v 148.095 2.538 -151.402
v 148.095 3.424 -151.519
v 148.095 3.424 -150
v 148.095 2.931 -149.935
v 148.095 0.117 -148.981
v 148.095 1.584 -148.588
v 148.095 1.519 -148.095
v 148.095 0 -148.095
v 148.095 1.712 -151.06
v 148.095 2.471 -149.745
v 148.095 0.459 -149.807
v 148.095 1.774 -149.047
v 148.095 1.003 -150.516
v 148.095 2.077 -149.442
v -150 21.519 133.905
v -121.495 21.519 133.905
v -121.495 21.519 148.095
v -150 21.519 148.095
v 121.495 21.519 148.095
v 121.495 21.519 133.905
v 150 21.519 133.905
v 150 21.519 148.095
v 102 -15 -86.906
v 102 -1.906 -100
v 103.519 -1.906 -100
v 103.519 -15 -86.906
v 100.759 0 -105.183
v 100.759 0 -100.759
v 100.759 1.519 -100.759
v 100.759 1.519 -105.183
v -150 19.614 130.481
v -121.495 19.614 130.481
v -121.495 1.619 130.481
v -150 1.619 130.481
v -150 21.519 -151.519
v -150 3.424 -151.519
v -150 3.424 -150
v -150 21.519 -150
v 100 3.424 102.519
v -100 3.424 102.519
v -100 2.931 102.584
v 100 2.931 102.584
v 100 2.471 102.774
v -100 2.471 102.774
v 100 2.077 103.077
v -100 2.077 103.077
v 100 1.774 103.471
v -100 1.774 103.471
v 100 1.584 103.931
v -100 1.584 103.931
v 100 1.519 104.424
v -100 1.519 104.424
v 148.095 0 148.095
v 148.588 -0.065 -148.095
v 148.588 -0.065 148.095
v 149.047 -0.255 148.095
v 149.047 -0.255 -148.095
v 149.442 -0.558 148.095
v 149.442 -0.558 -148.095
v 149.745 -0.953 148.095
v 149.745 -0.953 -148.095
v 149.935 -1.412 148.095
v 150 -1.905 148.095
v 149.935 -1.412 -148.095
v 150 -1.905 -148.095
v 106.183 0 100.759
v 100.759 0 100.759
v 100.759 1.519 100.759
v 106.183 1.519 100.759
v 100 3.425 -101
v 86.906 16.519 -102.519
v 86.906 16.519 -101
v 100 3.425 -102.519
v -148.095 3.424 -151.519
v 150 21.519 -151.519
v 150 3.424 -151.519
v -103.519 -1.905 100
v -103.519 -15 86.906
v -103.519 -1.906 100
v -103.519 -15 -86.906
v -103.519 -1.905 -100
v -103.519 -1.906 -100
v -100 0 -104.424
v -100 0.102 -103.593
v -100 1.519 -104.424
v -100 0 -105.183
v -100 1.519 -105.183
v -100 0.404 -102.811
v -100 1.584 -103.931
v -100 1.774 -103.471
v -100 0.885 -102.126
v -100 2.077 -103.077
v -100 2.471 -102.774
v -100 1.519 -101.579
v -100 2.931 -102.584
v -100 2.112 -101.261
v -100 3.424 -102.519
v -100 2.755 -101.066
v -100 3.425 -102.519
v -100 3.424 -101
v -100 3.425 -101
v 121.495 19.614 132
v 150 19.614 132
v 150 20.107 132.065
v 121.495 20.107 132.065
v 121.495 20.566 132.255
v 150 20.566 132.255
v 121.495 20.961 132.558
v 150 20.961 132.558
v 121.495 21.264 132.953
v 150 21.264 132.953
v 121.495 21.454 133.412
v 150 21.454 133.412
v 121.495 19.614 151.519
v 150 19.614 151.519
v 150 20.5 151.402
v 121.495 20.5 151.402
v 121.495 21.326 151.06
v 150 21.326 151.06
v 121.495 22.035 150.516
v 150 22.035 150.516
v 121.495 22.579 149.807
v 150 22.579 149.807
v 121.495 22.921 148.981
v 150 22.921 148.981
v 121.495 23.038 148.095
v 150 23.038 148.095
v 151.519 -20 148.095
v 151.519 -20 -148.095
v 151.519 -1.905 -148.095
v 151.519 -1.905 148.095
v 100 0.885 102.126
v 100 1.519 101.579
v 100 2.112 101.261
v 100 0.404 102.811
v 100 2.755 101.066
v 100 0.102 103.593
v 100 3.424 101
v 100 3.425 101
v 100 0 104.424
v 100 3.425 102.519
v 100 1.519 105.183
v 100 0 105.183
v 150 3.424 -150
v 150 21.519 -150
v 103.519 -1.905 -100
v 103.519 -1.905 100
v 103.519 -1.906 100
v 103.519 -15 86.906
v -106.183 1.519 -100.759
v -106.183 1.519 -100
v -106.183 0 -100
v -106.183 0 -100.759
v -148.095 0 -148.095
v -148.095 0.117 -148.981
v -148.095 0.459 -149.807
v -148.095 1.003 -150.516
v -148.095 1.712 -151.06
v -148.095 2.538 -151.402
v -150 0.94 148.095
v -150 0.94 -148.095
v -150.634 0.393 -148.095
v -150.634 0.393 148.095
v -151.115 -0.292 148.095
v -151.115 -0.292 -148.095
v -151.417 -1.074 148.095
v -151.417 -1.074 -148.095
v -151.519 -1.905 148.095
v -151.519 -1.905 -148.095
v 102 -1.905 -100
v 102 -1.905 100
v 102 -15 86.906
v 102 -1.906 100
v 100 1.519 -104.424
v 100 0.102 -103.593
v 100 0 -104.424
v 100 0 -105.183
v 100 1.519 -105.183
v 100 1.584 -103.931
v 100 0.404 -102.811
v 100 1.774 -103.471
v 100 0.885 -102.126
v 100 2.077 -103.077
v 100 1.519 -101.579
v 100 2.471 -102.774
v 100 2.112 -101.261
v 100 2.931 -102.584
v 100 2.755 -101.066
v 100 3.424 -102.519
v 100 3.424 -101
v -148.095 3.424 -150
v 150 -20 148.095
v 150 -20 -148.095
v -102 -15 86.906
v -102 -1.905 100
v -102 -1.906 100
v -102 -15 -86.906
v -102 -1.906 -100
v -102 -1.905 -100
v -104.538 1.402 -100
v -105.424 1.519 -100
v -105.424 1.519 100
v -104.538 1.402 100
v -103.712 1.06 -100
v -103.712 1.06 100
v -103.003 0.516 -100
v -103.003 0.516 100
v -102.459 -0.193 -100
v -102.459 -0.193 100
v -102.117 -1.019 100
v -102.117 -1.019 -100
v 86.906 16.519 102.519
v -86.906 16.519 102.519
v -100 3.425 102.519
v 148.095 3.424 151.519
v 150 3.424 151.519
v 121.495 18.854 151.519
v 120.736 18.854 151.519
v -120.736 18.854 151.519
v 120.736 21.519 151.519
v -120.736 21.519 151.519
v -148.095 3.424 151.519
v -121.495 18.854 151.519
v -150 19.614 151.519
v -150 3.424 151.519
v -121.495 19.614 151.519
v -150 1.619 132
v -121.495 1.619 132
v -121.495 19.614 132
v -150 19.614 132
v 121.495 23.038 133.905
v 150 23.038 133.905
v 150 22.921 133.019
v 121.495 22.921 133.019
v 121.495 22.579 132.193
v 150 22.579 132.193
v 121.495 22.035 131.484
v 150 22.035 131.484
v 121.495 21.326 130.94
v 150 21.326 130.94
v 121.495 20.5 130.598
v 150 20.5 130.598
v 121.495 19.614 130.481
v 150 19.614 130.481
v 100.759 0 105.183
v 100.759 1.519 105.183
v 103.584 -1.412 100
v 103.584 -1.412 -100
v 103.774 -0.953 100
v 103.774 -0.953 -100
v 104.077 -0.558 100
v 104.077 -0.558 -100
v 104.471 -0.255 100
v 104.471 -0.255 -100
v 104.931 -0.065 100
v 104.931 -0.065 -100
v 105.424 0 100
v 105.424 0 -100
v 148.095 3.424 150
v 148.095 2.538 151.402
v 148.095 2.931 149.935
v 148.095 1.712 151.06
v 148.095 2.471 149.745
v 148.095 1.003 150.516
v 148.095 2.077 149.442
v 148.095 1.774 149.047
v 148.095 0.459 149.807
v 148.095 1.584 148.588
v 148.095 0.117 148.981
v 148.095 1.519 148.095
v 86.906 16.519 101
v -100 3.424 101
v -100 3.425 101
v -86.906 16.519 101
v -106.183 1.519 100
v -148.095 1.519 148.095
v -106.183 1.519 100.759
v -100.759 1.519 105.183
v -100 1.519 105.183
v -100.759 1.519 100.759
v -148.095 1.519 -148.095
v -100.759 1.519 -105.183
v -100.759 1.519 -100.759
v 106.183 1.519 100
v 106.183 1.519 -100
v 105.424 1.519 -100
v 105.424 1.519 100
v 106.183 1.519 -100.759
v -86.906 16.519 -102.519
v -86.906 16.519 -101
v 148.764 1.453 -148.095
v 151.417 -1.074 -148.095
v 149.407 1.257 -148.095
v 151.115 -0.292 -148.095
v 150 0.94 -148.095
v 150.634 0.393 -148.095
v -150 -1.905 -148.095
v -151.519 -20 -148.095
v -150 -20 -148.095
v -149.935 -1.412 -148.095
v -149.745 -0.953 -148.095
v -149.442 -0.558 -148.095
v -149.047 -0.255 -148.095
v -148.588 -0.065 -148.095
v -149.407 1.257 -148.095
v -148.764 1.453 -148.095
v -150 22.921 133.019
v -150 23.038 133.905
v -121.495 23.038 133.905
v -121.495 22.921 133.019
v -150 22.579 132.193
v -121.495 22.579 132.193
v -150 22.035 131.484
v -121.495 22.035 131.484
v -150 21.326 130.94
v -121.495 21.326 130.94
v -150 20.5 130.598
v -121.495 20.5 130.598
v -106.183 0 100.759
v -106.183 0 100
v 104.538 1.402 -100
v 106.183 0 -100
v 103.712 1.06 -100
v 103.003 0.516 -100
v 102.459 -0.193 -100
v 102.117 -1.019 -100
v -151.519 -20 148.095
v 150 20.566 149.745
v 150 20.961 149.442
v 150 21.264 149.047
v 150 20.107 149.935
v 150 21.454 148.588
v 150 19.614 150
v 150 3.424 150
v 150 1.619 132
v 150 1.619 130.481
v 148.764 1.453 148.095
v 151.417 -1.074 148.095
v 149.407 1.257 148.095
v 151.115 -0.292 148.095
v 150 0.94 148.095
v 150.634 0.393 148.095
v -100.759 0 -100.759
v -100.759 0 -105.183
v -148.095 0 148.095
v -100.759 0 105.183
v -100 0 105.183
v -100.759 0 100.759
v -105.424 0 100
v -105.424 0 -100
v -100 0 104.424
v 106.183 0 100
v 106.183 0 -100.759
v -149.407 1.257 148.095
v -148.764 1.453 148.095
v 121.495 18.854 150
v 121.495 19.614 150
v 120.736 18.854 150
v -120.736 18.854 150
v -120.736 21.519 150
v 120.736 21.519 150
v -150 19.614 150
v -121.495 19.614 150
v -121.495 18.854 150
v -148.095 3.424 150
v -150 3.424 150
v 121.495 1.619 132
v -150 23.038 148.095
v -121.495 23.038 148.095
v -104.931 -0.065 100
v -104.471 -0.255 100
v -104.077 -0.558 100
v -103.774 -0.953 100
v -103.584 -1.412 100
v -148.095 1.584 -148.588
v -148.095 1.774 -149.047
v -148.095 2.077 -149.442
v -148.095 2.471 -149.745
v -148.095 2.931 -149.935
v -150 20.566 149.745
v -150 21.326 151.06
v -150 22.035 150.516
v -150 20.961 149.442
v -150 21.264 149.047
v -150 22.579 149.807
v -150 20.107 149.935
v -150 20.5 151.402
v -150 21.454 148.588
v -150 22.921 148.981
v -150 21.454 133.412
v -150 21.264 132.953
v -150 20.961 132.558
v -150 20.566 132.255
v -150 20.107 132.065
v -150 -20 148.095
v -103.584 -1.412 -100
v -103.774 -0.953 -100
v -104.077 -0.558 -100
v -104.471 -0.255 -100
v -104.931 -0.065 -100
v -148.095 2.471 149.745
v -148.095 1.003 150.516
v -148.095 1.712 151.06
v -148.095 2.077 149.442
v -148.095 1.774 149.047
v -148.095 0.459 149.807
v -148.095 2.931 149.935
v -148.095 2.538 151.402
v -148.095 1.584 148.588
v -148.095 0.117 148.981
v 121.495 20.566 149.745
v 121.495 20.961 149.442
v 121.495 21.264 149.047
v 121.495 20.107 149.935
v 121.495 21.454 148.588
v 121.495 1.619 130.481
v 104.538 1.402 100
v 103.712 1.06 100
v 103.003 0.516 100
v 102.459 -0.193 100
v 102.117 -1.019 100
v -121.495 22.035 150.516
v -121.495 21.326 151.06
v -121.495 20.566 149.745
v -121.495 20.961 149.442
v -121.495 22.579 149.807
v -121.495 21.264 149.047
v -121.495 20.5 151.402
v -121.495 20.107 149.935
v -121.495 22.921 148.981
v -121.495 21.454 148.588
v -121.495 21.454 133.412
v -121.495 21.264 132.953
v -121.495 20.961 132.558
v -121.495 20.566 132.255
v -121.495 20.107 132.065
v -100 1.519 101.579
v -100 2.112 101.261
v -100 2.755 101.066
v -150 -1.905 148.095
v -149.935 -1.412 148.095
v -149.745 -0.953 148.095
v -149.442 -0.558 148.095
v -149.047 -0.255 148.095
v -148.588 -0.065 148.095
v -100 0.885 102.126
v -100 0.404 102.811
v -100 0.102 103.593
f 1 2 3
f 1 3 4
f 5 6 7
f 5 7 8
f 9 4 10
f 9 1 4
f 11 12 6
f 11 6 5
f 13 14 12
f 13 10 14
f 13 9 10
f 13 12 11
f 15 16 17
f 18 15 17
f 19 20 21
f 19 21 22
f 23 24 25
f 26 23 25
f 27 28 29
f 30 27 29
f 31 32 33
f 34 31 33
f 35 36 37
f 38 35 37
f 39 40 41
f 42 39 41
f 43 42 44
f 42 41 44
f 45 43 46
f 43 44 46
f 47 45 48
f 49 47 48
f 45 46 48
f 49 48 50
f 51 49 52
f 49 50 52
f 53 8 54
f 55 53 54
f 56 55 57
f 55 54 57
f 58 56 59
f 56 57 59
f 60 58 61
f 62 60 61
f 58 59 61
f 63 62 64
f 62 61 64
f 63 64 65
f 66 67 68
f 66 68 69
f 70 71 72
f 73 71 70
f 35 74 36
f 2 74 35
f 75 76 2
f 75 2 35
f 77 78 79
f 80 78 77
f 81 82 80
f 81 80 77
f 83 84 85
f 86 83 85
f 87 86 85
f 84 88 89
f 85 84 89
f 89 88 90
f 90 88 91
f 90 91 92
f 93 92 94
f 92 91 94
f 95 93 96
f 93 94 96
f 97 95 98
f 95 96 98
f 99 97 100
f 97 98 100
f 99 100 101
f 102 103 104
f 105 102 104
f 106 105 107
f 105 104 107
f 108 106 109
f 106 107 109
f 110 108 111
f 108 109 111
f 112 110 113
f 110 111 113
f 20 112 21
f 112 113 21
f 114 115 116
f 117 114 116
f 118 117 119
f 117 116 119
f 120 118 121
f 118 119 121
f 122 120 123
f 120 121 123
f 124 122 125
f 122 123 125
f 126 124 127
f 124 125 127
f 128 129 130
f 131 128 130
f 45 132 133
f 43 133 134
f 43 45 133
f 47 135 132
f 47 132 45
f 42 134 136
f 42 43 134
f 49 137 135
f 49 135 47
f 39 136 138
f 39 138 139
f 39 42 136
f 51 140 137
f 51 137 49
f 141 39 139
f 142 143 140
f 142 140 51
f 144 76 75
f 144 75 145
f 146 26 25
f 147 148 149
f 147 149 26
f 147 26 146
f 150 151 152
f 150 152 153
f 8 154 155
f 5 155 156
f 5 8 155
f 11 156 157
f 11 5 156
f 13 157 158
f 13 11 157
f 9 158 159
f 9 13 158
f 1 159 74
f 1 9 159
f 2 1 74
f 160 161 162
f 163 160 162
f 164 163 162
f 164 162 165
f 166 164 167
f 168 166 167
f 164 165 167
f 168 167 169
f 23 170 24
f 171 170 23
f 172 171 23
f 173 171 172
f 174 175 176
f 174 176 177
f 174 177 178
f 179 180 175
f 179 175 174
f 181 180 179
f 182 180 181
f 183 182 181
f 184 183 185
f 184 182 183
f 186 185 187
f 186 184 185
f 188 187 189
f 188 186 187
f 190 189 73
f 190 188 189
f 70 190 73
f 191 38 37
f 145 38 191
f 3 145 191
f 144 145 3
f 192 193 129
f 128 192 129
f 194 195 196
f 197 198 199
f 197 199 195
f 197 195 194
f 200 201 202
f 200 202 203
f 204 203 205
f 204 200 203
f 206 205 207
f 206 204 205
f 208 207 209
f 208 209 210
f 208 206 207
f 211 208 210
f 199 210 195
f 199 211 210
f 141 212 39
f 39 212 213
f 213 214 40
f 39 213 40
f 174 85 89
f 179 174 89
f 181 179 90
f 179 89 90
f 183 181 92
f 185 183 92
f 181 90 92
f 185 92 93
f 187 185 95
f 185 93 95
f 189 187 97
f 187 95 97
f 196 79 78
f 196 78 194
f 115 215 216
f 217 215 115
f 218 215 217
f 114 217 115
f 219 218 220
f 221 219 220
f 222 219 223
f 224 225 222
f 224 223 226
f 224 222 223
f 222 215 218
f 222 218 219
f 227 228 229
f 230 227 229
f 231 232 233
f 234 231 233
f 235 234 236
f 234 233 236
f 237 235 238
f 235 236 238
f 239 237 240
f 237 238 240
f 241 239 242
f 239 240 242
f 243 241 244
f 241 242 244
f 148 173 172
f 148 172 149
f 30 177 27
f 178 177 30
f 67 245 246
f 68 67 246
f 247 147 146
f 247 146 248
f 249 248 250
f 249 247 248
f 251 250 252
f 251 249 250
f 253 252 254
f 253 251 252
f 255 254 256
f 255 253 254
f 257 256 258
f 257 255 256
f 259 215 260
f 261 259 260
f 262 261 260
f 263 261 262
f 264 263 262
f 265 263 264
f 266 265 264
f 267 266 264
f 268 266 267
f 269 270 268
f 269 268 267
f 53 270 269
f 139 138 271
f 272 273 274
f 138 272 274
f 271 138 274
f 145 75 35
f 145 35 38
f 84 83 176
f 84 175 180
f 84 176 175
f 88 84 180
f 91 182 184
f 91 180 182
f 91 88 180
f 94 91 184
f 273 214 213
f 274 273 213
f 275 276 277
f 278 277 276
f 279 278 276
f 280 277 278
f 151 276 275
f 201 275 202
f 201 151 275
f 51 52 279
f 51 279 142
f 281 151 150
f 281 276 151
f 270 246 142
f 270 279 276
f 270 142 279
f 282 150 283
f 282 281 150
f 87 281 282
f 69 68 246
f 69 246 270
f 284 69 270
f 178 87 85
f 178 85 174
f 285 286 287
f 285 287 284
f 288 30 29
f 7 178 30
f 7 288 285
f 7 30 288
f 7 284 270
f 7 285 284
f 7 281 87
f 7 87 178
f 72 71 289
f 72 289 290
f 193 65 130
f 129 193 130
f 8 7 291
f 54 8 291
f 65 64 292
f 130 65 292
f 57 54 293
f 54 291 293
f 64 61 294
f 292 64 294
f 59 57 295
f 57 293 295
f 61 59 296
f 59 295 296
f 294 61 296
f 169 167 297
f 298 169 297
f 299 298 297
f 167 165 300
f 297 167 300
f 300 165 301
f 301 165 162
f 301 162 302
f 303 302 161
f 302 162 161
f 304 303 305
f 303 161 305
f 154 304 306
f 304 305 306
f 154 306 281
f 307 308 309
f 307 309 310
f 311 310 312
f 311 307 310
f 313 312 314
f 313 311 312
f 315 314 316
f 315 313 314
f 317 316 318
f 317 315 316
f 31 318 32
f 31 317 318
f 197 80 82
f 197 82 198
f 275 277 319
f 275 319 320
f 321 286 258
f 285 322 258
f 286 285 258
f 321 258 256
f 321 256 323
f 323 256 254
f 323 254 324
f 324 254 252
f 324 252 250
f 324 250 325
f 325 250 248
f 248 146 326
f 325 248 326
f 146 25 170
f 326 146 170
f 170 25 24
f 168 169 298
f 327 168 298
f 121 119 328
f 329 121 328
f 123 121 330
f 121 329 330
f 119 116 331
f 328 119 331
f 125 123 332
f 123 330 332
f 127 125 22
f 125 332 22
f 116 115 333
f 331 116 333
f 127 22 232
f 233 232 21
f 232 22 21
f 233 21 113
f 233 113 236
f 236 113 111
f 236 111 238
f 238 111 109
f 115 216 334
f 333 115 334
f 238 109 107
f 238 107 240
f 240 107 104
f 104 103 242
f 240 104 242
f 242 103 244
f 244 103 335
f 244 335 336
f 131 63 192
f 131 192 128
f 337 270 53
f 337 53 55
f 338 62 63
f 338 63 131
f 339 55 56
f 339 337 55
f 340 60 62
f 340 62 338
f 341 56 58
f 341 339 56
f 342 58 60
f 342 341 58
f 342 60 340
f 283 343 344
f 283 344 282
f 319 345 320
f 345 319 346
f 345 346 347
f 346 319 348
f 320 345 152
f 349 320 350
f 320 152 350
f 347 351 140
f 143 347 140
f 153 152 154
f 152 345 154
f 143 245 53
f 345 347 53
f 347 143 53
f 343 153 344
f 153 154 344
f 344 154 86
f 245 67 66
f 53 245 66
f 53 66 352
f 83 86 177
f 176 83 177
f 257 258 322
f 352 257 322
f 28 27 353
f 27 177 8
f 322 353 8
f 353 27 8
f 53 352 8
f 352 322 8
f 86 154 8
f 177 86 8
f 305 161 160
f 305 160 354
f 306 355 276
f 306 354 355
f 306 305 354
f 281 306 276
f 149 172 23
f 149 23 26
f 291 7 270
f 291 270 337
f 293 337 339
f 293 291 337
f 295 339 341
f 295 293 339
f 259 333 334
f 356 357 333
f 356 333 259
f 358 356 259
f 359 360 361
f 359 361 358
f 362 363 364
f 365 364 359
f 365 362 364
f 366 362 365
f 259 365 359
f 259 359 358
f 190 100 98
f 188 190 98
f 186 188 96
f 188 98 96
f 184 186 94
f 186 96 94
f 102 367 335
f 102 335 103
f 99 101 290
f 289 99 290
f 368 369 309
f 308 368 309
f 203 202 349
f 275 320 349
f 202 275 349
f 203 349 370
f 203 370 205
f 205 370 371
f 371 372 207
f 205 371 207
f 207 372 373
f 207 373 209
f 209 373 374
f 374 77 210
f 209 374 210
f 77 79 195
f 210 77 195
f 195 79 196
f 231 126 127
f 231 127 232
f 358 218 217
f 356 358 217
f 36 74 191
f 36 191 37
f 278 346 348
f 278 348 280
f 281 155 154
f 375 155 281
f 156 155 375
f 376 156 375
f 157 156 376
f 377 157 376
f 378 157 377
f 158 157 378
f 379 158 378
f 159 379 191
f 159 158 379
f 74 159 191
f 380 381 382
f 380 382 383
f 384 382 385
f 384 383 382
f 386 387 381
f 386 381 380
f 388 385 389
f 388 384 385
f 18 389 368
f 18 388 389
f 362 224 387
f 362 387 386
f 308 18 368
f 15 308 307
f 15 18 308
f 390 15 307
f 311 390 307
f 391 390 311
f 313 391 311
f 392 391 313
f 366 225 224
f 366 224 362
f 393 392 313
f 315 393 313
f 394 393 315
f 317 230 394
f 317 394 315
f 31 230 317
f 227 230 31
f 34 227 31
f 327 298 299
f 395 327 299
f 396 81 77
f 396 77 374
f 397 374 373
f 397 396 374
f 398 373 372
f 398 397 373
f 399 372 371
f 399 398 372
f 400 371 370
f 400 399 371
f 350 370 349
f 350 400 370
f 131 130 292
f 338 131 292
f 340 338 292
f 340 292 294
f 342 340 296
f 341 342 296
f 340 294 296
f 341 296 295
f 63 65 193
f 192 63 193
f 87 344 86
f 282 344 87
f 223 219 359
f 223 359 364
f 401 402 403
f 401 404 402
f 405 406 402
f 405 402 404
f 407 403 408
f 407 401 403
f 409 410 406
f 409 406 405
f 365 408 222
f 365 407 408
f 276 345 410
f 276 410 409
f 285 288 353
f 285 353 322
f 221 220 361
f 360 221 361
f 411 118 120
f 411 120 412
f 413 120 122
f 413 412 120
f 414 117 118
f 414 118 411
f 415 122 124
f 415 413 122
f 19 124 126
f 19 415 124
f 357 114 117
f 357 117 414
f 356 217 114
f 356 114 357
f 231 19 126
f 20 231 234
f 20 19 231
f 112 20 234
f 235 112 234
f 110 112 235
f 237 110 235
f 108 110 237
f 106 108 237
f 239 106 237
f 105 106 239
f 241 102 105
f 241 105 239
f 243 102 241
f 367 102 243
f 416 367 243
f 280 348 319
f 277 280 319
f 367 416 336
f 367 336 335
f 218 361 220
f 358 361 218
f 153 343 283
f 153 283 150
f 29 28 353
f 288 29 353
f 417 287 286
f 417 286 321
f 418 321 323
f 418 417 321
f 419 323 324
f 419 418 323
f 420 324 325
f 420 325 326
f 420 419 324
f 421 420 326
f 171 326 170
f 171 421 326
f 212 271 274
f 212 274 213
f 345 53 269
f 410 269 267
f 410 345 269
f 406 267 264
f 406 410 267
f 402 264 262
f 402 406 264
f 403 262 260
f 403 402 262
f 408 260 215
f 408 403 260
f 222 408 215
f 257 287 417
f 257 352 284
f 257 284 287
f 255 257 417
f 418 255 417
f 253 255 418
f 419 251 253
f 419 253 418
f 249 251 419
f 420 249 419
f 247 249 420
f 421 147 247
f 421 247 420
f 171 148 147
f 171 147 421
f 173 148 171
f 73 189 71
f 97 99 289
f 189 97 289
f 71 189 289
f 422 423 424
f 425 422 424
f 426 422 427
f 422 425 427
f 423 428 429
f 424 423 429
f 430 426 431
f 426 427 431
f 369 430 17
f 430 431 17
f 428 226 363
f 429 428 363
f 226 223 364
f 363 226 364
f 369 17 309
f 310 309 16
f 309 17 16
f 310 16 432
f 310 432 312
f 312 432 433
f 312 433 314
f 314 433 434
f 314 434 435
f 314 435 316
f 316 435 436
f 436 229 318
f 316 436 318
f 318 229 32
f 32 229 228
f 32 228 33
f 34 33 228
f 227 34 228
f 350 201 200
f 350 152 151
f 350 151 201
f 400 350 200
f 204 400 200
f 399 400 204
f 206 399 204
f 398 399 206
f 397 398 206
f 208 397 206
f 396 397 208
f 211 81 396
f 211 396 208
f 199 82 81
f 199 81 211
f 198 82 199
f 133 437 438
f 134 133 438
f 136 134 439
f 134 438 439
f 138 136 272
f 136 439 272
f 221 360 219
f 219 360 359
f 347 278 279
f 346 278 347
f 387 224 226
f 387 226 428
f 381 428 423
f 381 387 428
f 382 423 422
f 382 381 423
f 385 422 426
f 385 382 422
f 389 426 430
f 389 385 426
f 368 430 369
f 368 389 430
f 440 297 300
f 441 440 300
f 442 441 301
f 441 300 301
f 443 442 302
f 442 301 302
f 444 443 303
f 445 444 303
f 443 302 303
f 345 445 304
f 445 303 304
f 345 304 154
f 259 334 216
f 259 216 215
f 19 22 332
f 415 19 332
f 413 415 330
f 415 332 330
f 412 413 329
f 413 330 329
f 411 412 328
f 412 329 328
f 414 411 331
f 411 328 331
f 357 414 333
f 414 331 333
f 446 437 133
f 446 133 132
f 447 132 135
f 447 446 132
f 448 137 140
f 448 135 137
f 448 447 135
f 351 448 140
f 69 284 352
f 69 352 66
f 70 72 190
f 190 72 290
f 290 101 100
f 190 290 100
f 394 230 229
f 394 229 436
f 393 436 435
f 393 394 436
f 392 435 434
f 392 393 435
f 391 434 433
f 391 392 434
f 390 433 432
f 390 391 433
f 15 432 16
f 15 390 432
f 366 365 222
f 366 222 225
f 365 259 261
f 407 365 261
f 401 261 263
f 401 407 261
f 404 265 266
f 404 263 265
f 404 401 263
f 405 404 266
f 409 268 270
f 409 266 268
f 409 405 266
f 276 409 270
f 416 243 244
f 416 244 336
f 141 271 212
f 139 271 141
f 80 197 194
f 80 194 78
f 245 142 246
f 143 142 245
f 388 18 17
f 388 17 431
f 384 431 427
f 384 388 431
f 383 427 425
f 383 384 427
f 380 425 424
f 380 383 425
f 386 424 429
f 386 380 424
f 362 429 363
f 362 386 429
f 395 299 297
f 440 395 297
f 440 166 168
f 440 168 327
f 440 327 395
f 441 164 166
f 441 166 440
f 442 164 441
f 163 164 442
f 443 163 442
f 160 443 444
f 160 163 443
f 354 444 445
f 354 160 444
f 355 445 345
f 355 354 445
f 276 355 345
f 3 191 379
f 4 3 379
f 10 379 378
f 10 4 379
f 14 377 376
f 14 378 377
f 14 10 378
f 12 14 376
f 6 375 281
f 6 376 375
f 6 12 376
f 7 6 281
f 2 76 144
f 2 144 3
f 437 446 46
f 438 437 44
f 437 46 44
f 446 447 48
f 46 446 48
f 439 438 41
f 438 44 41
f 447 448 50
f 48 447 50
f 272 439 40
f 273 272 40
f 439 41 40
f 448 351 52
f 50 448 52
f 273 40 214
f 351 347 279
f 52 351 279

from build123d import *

# Parameters (mm, degrees)
SKETCH1_W                       = 300
SKETCH1_H                       = 300
SKETCH1_W_2                     = 200
SKETCH1_H_2                     = 200
BASE_FLANGE1_DEPTH              = 1.51892
EDGE_FLANGE10_STRIP_W           = 9.88568
EDGE_FLANGE10_STRIP_H           = 1.51892
EDGE_FLANGE10_STRIP_CUT_DEPTH   = 300
EDGE_FLANGE10_STRIP_2_W         = 9.88568
EDGE_FLANGE10_STRIP_2_H         = 1.51892
EDGE_FLANGE10_STRIP_CUT_2_DEPTH = 300
EDGE_FLANGE10_DEPTH             = 300
EDGE_FLANGE10_BEND_DEPTH        = 300
EDGE_FLANGE2_START              = -151.51892
EDGE_FLANGE2_DEPTH              = 303.03784
EDGE_FLANGE2_2_DEPTH            = 3.42392
EDGE_FLANGE2_START_2            = 148.095
EDGE_FLANGE2_3_DEPTH            = 3.42392
EDGE_FLANGE2_START_3            = -148.095
EDGE_FLANGE2_4_DEPTH            = 296.19
EDGE_FLANGE7_START              = -100.75946
EDGE_FLANGE7_DEPTH              = 201.51892
EDGE_FLANGE7_2_DEPTH            = 0.75946
EDGE_FLANGE7_START_2            = 100
EDGE_FLANGE7_3_DEPTH            = 0.75946
EDGE_FLANGE7_START_3            = -100
EDGE_FLANGE7_4_DEPTH            = 200
EDGE_FLANGE8_STRIP_W            = 11.88568
EDGE_FLANGE8_STRIP_H            = 1.51892
EDGE_FLANGE8_STRIP_CUT_DEPTH    = 200
EDGE_FLANGE8_RELIEF_W           = 12.64514
EDGE_FLANGE8_RELIEF_H           = 0.75946
EDGE_FLANGE8_RELIEF_CUT_DEPTH   = 1.51892
EDGE_FLANGE8_STRIP_2_W          = 11.88568
EDGE_FLANGE8_STRIP_2_H          = 1.51892
EDGE_FLANGE8_STRIP_CUT_2_DEPTH  = 200
EDGE_FLANGE8_RELIEF_2_W         = 12.64514
EDGE_FLANGE8_RELIEF_2_H         = 0.75946
EDGE_FLANGE8_RELIEF_CUT_2_DEPTH = 1.51892
EDGE_FLANGE8_DEPTH              = 200
EDGE_FLANGE8_BEND_DEPTH         = 200
BREAK_CORNER1_START             = -82.391318469
BREAK_CORNER1_OUTLINE_W         = 22
BREAK_CORNER1_OUTLINE_H         = 208
BREAK_CORNER1_DEPTH             = 9.258856193
BREAK_CORNER1_START_2           = 73.132462276
BREAK_CORNER1_2_OUTLINE_W       = 22
BREAK_CORNER1_2_OUTLINE_H       = 208
BREAK_CORNER1_2_DEPTH           = 9.258856193
BREAK_CORNER1_START_3           = -81.317279836
BREAK_CORNER1_3_OUTLINE_W       = 210
BREAK_CORNER1_3_OUTLINE_H       = 22
BREAK_CORNER1_3_DEPTH           = 9.258856192
BREAK_CORNER1_4_OUTLINE_W       = 210
BREAK_CORNER1_4_OUTLINE_H       = 22
BREAK_CORNER1_4_DEPTH           = 9.258856192
EDGE_FLANGE11_STRIP_W           = 9.88568
EDGE_FLANGE11_STRIP_H           = 1.51892
EDGE_FLANGE11_STRIP_CUT_DEPTH   = 28.504683669
EDGE_FLANGE11_RELIEF_W          = 10.64514
EDGE_FLANGE11_RELIEF_H          = 0.75946
EDGE_FLANGE11_RELIEF_CUT_DEPTH  = 1.51892
EDGE_FLANGE11_DEPTH             = 28.504683669
EDGE_FLANGE12_STRIP_W           = 9.88568
EDGE_FLANGE12_STRIP_H           = 1.51892
EDGE_FLANGE12_STRIP_CUT_DEPTH   = 28.504683669
EDGE_FLANGE12_DEPTH             = 28.504683669


# Read off the part's stored shape, not the designer's step: Edge-Flange2, Edge-Flange7, Break-Corner1
# Sheet-metal steps are written as plain solids
with BuildPart() as part:
    # Sketch1 → Base-Flange1 (new body)
    with BuildSketch(Plane(origin=(0, 0, 0), x_dir=(1, 0, 0), z_dir=(0, 1, 0))):
        Rectangle(SKETCH1_W, SKETCH1_H)
        Rectangle(SKETCH1_W_2, SKETCH1_H_2, mode=Mode.SUBTRACT)
    extrude(amount=BASE_FLANGE1_DEPTH)

    # Edge-Flange10 strip (across the edge) → Edge-Flange10 strip cut (cut)
    with BuildSketch(Plane(origin=(150, 1.51892, -150), x_dir=(0, 0, 1), z_dir=(-1, 0, 0))):
        with Locations((-3.03784, -0.75946)):
            Rectangle(EDGE_FLANGE10_STRIP_W, EDGE_FLANGE10_STRIP_H)
    extrude(amount=EDGE_FLANGE10_STRIP_CUT_DEPTH, mode=Mode.SUBTRACT)

    # Edge-Flange10 strip 2 (across the edge) → Edge-Flange10 strip cut 2 (cut)
    with BuildSketch(Plane(origin=(-150, 1.51892, 150), x_dir=(0, 0, -1), z_dir=(1, 0, 0))):
        with Locations((-3.03784, -0.75946)):
            Rectangle(EDGE_FLANGE10_STRIP_2_W, EDGE_FLANGE10_STRIP_2_H)
    extrude(amount=EDGE_FLANGE10_STRIP_CUT_2_DEPTH, mode=Mode.SUBTRACT)

    # Edge-Flange10 section (across the edge) → Edge-Flange10 (add)
    with BuildSketch(Plane(origin=(150, 1.51892, -150), x_dir=(0, 0, 1), z_dir=(-1, 0, 0))):
        with BuildLine():
            Line((-1.51892, 1.905), (-1.51892, 20))
            Line((-1.51892, 20), (0, 20))
            Line((0, 20), (0, 1.905))
            ThreePointArc((0, 1.905), (0.557961582, 0.557961582), (1.905, 0))
            Line((1.905, 0), (1.905, -1.51892))
            ThreePointArc((1.905, -1.51892), (-0.51607705, -0.51607705), (-1.51892, 1.905))
        make_face()
    extrude(amount=EDGE_FLANGE10_DEPTH)

    # Edge-Flange10 section 2 (across the edge) → Edge-Flange10 bend (add)
    with BuildSketch(Plane(origin=(-150, 1.51892, 150), x_dir=(0, 0, -1), z_dir=(1, 0, 0))):
        with BuildLine():
            Line((-1.51892, 1.905), (-1.51892, 20))
            Line((-1.51892, 20), (0, 20))
            Line((0, 20), (0, 1.905))
            ThreePointArc((0, 1.905), (0.557961582, 0.557961582), (1.905, 0))
            Line((1.905, 0), (1.905, -1.51892))
            ThreePointArc((1.905, -1.51892), (-0.51607705, -0.51607705), (-1.51892, 1.905))
        make_face()
    extrude(amount=EDGE_FLANGE10_BEND_DEPTH)

    # Edge-Flange2 outline → Edge-Flange2 (cut)
    with BuildSketch(Plane.XY.offset(EDGE_FLANGE2_START)):
        with BuildLine():
            Line((-148.095, 1.51892), (-148.095, 3.42392))
            Line((-148.095, 3.42392), (-150, 3.42392))
            Line((-150, 3.42392), (-150, 0.940031312))
            ThreePointArc((-150, 0.940031312), (-149.090507046, 1.37100273), (-148.095, 1.51892))
        make_face()
        with BuildLine():
            Line((150, 0.940031312), (150, 3.42392))
            Line((150, 3.42392), (148.095, 3.42392))
            Line((148.095, 3.42392), (148.095, 1.51892))
            ThreePointArc((148.095, 1.51892), (149.090507046, 1.37100273), (150, 0.940031312))
        make_face()
    extrude(amount=EDGE_FLANGE2_DEPTH, mode=Mode.SUBTRACT)

    # Edge-Flange2 2 outline → Edge-Flange2 2 (cut)
    with BuildSketch(Plane.XY.offset(EDGE_FLANGE2_START)):
        with BuildLine():
            Line((-148.095, 0), (-148.095, 1.51892))
            ThreePointArc((-148.095, 1.51892), (-149.090507046, 1.37100273), (-150, 0.940031312))
            ThreePointArc((-150, 0.940031312), (-151.115413528, -0.292446037), (-151.51892, -1.905))
            Line((-151.51892, -1.905), (-151.51892, -20))
            Line((-151.51892, -20), (-150, -20))
            Line((-150, -20), (-150, -1.905))
            ThreePointArc((-150, -1.905), (-149.442038418, -0.557961582), (-148.095, 0))
        make_face()
        with BuildLine():
            ThreePointArc((150, 0.940031312), (149.090507046, 1.37100273), (148.095, 1.51892))
            Line((148.095, 1.51892), (148.095, 0))
            ThreePointArc((148.095, 0), (149.442038418, -0.557961582), (150, -1.905))
            Line((150, -1.905), (150, -20))
            Line((150, -20), (151.51892, -20))
            Line((151.51892, -20), (151.51892, -1.905))
            ThreePointArc((151.51892, -1.905), (151.115413528, -0.292446037), (150, 0.940031312))
        make_face()
    extrude(amount=EDGE_FLANGE2_2_DEPTH, mode=Mode.SUBTRACT)

    # Edge-Flange2 3 outline → Edge-Flange2 3 (cut)
    with BuildSketch(Plane.XY.offset(EDGE_FLANGE2_START_2)):
        with BuildLine():
            Line((-148.095, 0), (-148.095, 1.51892))
            ThreePointArc((-148.095, 1.51892), (-149.090507046, 1.37100273), (-150, 0.940031312))
            ThreePointArc((-150, 0.940031312), (-151.115413528, -0.292446037), (-151.51892, -1.905))
            Line((-151.51892, -1.905), (-151.51892, -20))
            Line((-151.51892, -20), (-150, -20))
            Line((-150, -20), (-150, -1.905))
            ThreePointArc((-150, -1.905), (-149.442038418, -0.557961582), (-148.095, 0))
        make_face()
        with BuildLine():
            ThreePointArc((150, 0.940031312), (149.090507046, 1.37100273), (148.095, 1.51892))
            Line((148.095, 1.51892), (148.095, 0))
            ThreePointArc((148.095, 0), (149.442038418, -0.557961582), (150, -1.905))
            Line((150, -1.905), (150, -20))
            Line((150, -20), (151.51892, -20))
            Line((151.51892, -20), (151.51892, -1.905))
            ThreePointArc((151.51892, -1.905), (151.115413528, -0.292446037), (150, 0.940031312))
        make_face()
    extrude(amount=EDGE_FLANGE2_3_DEPTH, mode=Mode.SUBTRACT)

    # Edge-Flange2 4 outline → Edge-Flange2 4 (add)
    with BuildSketch(Plane.XY.offset(EDGE_FLANGE2_START_3)):
        with BuildLine():
            Line((-148.095, 0), (-148.095, 1.51892))
            ThreePointArc((-148.095, 1.51892), (-149.090507046, 1.37100273), (-150, 0.940031312))
            ThreePointArc((-150, 0.940031312), (-151.115413528, -0.292446037), (-151.51892, -1.905))
            Line((-151.51892, -1.905), (-151.51892, -20))
            Line((-151.51892, -20), (-150, -20))
            Line((-150, -20), (-150, -1.905))
            ThreePointArc((-150, -1.905), (-149.442038418, -0.557961582), (-148.095, 0))
        make_face()
        with BuildLine():
            ThreePointArc((150, 0.940031312), (149.090507046, 1.37100273), (148.095, 1.51892))
            Line((148.095, 1.51892), (148.095, 0))
            ThreePointArc((148.095, 0), (149.442038418, -0.557961582), (150, -1.905))
            Line((150, -1.905), (150, -20))
            Line((150, -20), (151.51892, -20))
            Line((151.51892, -20), (151.51892, -1.905))
            ThreePointArc((151.51892, -1.905), (151.115413528, -0.292446037), (150, 0.940031312))
        make_face()
    extrude(amount=EDGE_FLANGE2_4_DEPTH)

    # Edge-Flange7 outline → Edge-Flange7 (cut)
    with BuildSketch(Plane.YZ.offset(EDGE_FLANGE7_START)):
        with BuildLine():
            ThreePointArc((1.51892, 101.578888688), (0.403506472, 102.811366037), (0, 104.42392))
            Line((0, 104.42392), (0, 100))
            Line((0, 100), (1.51892, 100))
            Line((1.51892, 100), (1.51892, 101.578888688))
        make_face()
        with BuildLine():
            Line((1.51892, -100), (0, -100))
            Line((0, -100), (0, -104.42392))
            ThreePointArc((0, -104.42392), (0.403506472, -102.811366037), (1.51892, -101.578888688))
            Line((1.51892, -101.578888688), (1.51892, -100))
        make_face()
    extrude(amount=EDGE_FLANGE7_DEPTH, mode=Mode.SUBTRACT)

    # Edge-Flange7 2 outline → Edge-Flange7 2 (cut)
    with BuildSketch(Plane.YZ.offset(EDGE_FLANGE7_START)):
        with BuildLine():
            Line((1.51892, 105.18338), (0, 105.18338))
            Line((0, 105.18338), (0, 104.42392))
            ThreePointArc((0, 104.42392), (0.403506472, 102.811366037), (1.51892, 101.578888688))
            Line((1.51892, 101.578888688), (1.51892, 105.18338))
        make_face()
        with BuildLine():
            ThreePointArc((1.51892, -101.578888688), (0.403506472, -102.811366037), (0, -104.42392))
            Line((0, -104.42392), (0, -105.18338))
            Line((0, -105.18338), (1.51892, -105.18338))
            Line((1.51892, -105.18338), (1.51892, -101.578888688))
        make_face()
    extrude(amount=EDGE_FLANGE7_2_DEPTH, mode=Mode.SUBTRACT)

    # Edge-Flange7 3 outline → Edge-Flange7 3 (cut)
    with BuildSketch(Plane.YZ.offset(EDGE_FLANGE7_START_2)):
        with BuildLine():
            Line((1.51892, 105.18338), (0, 105.18338))
            Line((0, 105.18338), (0, 104.42392))
            ThreePointArc((0, 104.42392), (0.403506472, 102.811366037), (1.51892, 101.578888688))
            Line((1.51892, 101.578888688), (1.51892, 105.18338))
        make_face()
        with BuildLine():
            ThreePointArc((1.51892, -101.578888688), (0.403506472, -102.811366037), (0, -104.42392))
            Line((0, -104.42392), (0, -105.18338))
            Line((0, -105.18338), (1.51892, -105.18338))
            Line((1.51892, -105.18338), (1.51892, -101.578888688))
        make_face()
    extrude(amount=EDGE_FLANGE7_3_DEPTH, mode=Mode.SUBTRACT)

    # Edge-Flange7 4 outline → Edge-Flange7 4 (add)
    with BuildSketch(Plane.YZ.offset(EDGE_FLANGE7_START_3)):
        with BuildLine():
            ThreePointArc((3.42392, 102.51892), (2.076881582, 103.076881582), (1.51892, 104.42392))
            Line((1.51892, 104.42392), (1.51892, 101.578888688))
            ThreePointArc((1.51892, 101.578888688), (2.428412954, 101.14791727), (3.42392, 101))
            Line((3.42392, 101), (16.51892, 101))
            Line((16.51892, 101), (16.51892, 102.51892))
            Line((16.51892, 102.51892), (3.42392, 102.51892))
        make_face()
        with BuildLine():
            ThreePointArc((3.42392, -101), (2.428412954, -101.14791727), (1.51892, -101.578888688))
            Line((1.51892, -101.578888688), (1.51892, -104.42392))
            ThreePointArc((1.51892, -104.42392), (2.076881582, -103.076881582), (3.42392, -102.51892))
            Line((3.42392, -102.51892), (16.51892, -102.51892))
            Line((16.51892, -102.51892), (16.51892, -101))
            Line((16.51892, -101), (3.42392, -101))
        make_face()
    extrude(amount=EDGE_FLANGE7_4_DEPTH)

    # Edge-Flange8 strip (across the edge) → Edge-Flange8 strip cut (cut)
    with BuildSketch(Plane(origin=(102, 0, 100), x_dir=(1, 0, 0), z_dir=(0, 0, -1))):
        with Locations((-2.51892, -0.75946)):
            Rectangle(EDGE_FLANGE8_STRIP_W, EDGE_FLANGE8_STRIP_H)
    extrude(amount=EDGE_FLANGE8_STRIP_CUT_DEPTH, mode=Mode.SUBTRACT)

    # Edge-Flange8 relief (on the sheet) → Edge-Flange8 relief cut (cut)
    with BuildSketch(Plane(origin=(105.42392, 0, 100), x_dir=(1, 0, 0), z_dir=(0, -1, 0))):
        with Locations((-5.56311, 0.37973)):
            Rectangle(EDGE_FLANGE8_RELIEF_W, EDGE_FLANGE8_RELIEF_H)
        with Locations((-5.56311, -200.37973)):
            Rectangle(EDGE_FLANGE8_RELIEF_W, EDGE_FLANGE8_RELIEF_H)
    extrude(amount=-EDGE_FLANGE8_RELIEF_CUT_DEPTH, mode=Mode.SUBTRACT)

    # Edge-Flange8 strip 2 (across the edge) → Edge-Flange8 strip cut 2 (cut)
    with BuildSketch(Plane(origin=(-102, 0, -100), x_dir=(-1, 0, 0), z_dir=(0, 0, 1))):
        with Locations((-2.51892, -0.75946)):
            Rectangle(EDGE_FLANGE8_STRIP_2_W, EDGE_FLANGE8_STRIP_2_H)
    extrude(amount=EDGE_FLANGE8_STRIP_CUT_2_DEPTH, mode=Mode.SUBTRACT)

    # Edge-Flange8 relief 2 (on the sheet) → Edge-Flange8 relief cut 2 (cut)
    with BuildSketch(Plane(origin=(-105.42392, 0, -100), x_dir=(-1, 0, 0), z_dir=(0, -1, 0))):
        with Locations((-5.56311, 0.37973)):
            Rectangle(EDGE_FLANGE8_RELIEF_2_W, EDGE_FLANGE8_RELIEF_2_H)
        with Locations((-5.56311, -200.37973)):
            Rectangle(EDGE_FLANGE8_RELIEF_2_W, EDGE_FLANGE8_RELIEF_2_H)
    extrude(amount=-EDGE_FLANGE8_RELIEF_CUT_2_DEPTH, mode=Mode.SUBTRACT)

    # Edge-Flange8 section (across the edge) → Edge-Flange8 (add)
    with BuildSketch(Plane(origin=(102, 0, 100), x_dir=(1, 0, 0), z_dir=(0, 0, -1))):
        with BuildLine():
            Line((0, 1.905), (0, 15))
            Line((0, 15), (1.51892, 15))
            Line((1.51892, 15), (1.51892, 1.905))
            ThreePointArc((1.51892, 1.905), (2.076881582, 0.557961582), (3.42392, 0))
            Line((3.42392, 0), (3.42392, -1.51892))
            ThreePointArc((3.42392, -1.51892), (1.00284295, -0.51607705), (0, 1.905))
        make_face()
    extrude(amount=EDGE_FLANGE8_DEPTH)

    # Edge-Flange8 section 2 (across the edge) → Edge-Flange8 bend (add)
    with BuildSketch(Plane(origin=(-102, 0, -100), x_dir=(-1, 0, 0), z_dir=(0, 0, 1))):
        with BuildLine():
            Line((0, 1.905), (0, 15))
            Line((0, 15), (1.51892, 15))
            Line((1.51892, 15), (1.51892, 1.905))
            ThreePointArc((1.51892, 1.905), (2.076881582, 0.557961582), (3.42392, 0))
            Line((3.42392, 0), (3.42392, -1.51892))
            ThreePointArc((3.42392, -1.51892), (1.00284295, -0.51607705), (0, 1.905))
        make_face()
    extrude(amount=EDGE_FLANGE8_BEND_DEPTH)

    # Break-Corner1 outline → Break-Corner1 (cut)
    with BuildSketch(Plane(origin=(0, 0, 0), x_dir=(0.7071067811865471, 0.707106781186548, 0), z_dir=(0.707106781186548, -0.707106781186547, 0)).offset(BREAK_CORNER1_START)):
        with Locations((-59, 0)):
            Rectangle(BREAK_CORNER1_OUTLINE_W, BREAK_CORNER1_OUTLINE_H)
    extrude(amount=BREAK_CORNER1_DEPTH, mode=Mode.SUBTRACT)

    # Break-Corner1 2 outline → Break-Corner1 2 (cut)
    with BuildSketch(Plane(origin=(0, 0, 0), x_dir=(0.7071067811865471, -0.707106781186548, 0), z_dir=(0.707106781186548, 0.707106781186547, 0)).offset(BREAK_CORNER1_START_2)):
        with Locations((59, 0)):
            Rectangle(BREAK_CORNER1_2_OUTLINE_W, BREAK_CORNER1_2_OUTLINE_H)
    extrude(amount=BREAK_CORNER1_2_DEPTH, mode=Mode.SUBTRACT)

    # Break-Corner1 3 outline → Break-Corner1 3 (cut)
    with BuildSketch(Plane(origin=(0, 0, 0), x_dir=(1, 0, 0), z_dir=(0, 0.707106781186549, -0.707106781186546)).offset(BREAK_CORNER1_START_3)):
        with Locations((0, -60)):
            Rectangle(BREAK_CORNER1_3_OUTLINE_W, BREAK_CORNER1_3_OUTLINE_H)
    extrude(amount=BREAK_CORNER1_3_DEPTH, mode=Mode.SUBTRACT)

    # Break-Corner1 4 outline → Break-Corner1 4 (cut)
    with BuildSketch(Plane(origin=(0, 0, 0), x_dir=(1, 0, 0), z_dir=(0, 0.707106781186547, 0.707106781186548)).offset(BREAK_CORNER1_START_3)):
        with Locations((0, 60)):
            Rectangle(BREAK_CORNER1_4_OUTLINE_W, BREAK_CORNER1_4_OUTLINE_H)
    extrude(amount=BREAK_CORNER1_4_DEPTH, mode=Mode.SUBTRACT)

    # Edge-Flange11 strip (across the edge) → Edge-Flange11 strip cut (cut)
    with BuildSketch(Plane(origin=(-150, 21.51892, 150), x_dir=(0, -1, 0), z_dir=(1, 0, 0))):
        with Locations((-3.03784, -0.75946)):
            Rectangle(EDGE_FLANGE11_STRIP_W, EDGE_FLANGE11_STRIP_H)
    edge_flange11_strip_cut = extrude(amount=EDGE_FLANGE11_STRIP_CUT_DEPTH, mode=Mode.SUBTRACT)

    # Edge-Flange11 relief (on the sheet) → Edge-Flange11 relief cut (cut)
    with BuildSketch(Plane(origin=(-150, 19.61392, 150), x_dir=(0, -1, 0), z_dir=(0, 0, -1))):
        with Locations((-4.56311, -28.884413669)):
            Rectangle(EDGE_FLANGE11_RELIEF_W, EDGE_FLANGE11_RELIEF_H)
    edge_flange11_relief_cut = extrude(amount=-EDGE_FLANGE11_RELIEF_CUT_DEPTH, mode=Mode.SUBTRACT)

    # Edge-Flange11 section (across the edge) → Edge-Flange11 (add)
    with BuildSketch(Plane(origin=(-150, 21.51892, 150), x_dir=(0, -1, 0), z_dir=(1, 0, 0))):
        with BuildLine():
            Line((-1.51892, 1.905), (-1.51892, 18))
            Line((-1.51892, 18), (0, 18))
            Line((0, 18), (0, 1.905))
            ThreePointArc((0, 1.905), (0.557961582, 0.557961582), (1.905, 0))
            Line((1.905, 0), (1.905, -1.51892))
            ThreePointArc((1.905, -1.51892), (-0.51607705, -0.51607705), (-1.51892, 1.905))
        make_face()
    edge_flange11 = extrude(amount=EDGE_FLANGE11_DEPTH)

    # Edge-Flange12 strip (across the edge) → Edge-Flange12 strip cut (cut)
    with BuildSketch(Plane(origin=(-150, 21.51892, 132), x_dir=(0, 0, 1), z_dir=(1, 0, 0))):
        with Locations((-3.03784, -0.75946)):
            Rectangle(EDGE_FLANGE12_STRIP_W, EDGE_FLANGE12_STRIP_H)
    edge_flange12_strip_cut = extrude(amount=EDGE_FLANGE12_STRIP_CUT_DEPTH, mode=Mode.SUBTRACT)

    # Edge-Flange12 section (across the edge) → Edge-Flange12 (add)
    with BuildSketch(Plane(origin=(-150, 21.51892, 132), x_dir=(0, 0, 1), z_dir=(1, 0, 0))):
        with BuildLine():
            Line((-1.51892, 1.905), (-1.51892, 19.9))
            Line((-1.51892, 19.9), (0, 19.9))
            Line((0, 19.9), (0, 1.905))
            ThreePointArc((0, 1.905), (0.557961582, 0.557961582), (1.905, 0))
            Line((1.905, 0), (1.905, -1.51892))
            ThreePointArc((1.905, -1.51892), (-0.51607705, -0.51607705), (-1.51892, 1.905))
        make_face()
    edge_flange12 = extrude(amount=EDGE_FLANGE12_DEPTH)

    # Mirror1: Edge-Flange11 strip cut, Edge-Flange11 relief cut, Edge-Flange11, Edge-Flange12 strip cut, Edge-Flange12 across plane
    add(edge_flange11_strip_cut.mirror(Plane(origin=(0, 0, 0), x_dir=(0, 0, 1), z_dir=(1, 0, 0))), mode=Mode.SUBTRACT)
    add(edge_flange11_relief_cut.mirror(Plane(origin=(0, 0, 0), x_dir=(0, 0, 1), z_dir=(1, 0, 0))), mode=Mode.SUBTRACT)
    add(edge_flange11.mirror(Plane(origin=(0, 0, 0), x_dir=(0, 0, 1), z_dir=(1, 0, 0))))
    add(edge_flange12_strip_cut.mirror(Plane(origin=(0, 0, 0), x_dir=(0, 0, 1), z_dir=(1, 0, 0))), mode=Mode.SUBTRACT)
    add(edge_flange12.mirror(Plane(origin=(0, 0, 0), x_dir=(0, 0, 1), z_dir=(1, 0, 0))))


solid = part.part
